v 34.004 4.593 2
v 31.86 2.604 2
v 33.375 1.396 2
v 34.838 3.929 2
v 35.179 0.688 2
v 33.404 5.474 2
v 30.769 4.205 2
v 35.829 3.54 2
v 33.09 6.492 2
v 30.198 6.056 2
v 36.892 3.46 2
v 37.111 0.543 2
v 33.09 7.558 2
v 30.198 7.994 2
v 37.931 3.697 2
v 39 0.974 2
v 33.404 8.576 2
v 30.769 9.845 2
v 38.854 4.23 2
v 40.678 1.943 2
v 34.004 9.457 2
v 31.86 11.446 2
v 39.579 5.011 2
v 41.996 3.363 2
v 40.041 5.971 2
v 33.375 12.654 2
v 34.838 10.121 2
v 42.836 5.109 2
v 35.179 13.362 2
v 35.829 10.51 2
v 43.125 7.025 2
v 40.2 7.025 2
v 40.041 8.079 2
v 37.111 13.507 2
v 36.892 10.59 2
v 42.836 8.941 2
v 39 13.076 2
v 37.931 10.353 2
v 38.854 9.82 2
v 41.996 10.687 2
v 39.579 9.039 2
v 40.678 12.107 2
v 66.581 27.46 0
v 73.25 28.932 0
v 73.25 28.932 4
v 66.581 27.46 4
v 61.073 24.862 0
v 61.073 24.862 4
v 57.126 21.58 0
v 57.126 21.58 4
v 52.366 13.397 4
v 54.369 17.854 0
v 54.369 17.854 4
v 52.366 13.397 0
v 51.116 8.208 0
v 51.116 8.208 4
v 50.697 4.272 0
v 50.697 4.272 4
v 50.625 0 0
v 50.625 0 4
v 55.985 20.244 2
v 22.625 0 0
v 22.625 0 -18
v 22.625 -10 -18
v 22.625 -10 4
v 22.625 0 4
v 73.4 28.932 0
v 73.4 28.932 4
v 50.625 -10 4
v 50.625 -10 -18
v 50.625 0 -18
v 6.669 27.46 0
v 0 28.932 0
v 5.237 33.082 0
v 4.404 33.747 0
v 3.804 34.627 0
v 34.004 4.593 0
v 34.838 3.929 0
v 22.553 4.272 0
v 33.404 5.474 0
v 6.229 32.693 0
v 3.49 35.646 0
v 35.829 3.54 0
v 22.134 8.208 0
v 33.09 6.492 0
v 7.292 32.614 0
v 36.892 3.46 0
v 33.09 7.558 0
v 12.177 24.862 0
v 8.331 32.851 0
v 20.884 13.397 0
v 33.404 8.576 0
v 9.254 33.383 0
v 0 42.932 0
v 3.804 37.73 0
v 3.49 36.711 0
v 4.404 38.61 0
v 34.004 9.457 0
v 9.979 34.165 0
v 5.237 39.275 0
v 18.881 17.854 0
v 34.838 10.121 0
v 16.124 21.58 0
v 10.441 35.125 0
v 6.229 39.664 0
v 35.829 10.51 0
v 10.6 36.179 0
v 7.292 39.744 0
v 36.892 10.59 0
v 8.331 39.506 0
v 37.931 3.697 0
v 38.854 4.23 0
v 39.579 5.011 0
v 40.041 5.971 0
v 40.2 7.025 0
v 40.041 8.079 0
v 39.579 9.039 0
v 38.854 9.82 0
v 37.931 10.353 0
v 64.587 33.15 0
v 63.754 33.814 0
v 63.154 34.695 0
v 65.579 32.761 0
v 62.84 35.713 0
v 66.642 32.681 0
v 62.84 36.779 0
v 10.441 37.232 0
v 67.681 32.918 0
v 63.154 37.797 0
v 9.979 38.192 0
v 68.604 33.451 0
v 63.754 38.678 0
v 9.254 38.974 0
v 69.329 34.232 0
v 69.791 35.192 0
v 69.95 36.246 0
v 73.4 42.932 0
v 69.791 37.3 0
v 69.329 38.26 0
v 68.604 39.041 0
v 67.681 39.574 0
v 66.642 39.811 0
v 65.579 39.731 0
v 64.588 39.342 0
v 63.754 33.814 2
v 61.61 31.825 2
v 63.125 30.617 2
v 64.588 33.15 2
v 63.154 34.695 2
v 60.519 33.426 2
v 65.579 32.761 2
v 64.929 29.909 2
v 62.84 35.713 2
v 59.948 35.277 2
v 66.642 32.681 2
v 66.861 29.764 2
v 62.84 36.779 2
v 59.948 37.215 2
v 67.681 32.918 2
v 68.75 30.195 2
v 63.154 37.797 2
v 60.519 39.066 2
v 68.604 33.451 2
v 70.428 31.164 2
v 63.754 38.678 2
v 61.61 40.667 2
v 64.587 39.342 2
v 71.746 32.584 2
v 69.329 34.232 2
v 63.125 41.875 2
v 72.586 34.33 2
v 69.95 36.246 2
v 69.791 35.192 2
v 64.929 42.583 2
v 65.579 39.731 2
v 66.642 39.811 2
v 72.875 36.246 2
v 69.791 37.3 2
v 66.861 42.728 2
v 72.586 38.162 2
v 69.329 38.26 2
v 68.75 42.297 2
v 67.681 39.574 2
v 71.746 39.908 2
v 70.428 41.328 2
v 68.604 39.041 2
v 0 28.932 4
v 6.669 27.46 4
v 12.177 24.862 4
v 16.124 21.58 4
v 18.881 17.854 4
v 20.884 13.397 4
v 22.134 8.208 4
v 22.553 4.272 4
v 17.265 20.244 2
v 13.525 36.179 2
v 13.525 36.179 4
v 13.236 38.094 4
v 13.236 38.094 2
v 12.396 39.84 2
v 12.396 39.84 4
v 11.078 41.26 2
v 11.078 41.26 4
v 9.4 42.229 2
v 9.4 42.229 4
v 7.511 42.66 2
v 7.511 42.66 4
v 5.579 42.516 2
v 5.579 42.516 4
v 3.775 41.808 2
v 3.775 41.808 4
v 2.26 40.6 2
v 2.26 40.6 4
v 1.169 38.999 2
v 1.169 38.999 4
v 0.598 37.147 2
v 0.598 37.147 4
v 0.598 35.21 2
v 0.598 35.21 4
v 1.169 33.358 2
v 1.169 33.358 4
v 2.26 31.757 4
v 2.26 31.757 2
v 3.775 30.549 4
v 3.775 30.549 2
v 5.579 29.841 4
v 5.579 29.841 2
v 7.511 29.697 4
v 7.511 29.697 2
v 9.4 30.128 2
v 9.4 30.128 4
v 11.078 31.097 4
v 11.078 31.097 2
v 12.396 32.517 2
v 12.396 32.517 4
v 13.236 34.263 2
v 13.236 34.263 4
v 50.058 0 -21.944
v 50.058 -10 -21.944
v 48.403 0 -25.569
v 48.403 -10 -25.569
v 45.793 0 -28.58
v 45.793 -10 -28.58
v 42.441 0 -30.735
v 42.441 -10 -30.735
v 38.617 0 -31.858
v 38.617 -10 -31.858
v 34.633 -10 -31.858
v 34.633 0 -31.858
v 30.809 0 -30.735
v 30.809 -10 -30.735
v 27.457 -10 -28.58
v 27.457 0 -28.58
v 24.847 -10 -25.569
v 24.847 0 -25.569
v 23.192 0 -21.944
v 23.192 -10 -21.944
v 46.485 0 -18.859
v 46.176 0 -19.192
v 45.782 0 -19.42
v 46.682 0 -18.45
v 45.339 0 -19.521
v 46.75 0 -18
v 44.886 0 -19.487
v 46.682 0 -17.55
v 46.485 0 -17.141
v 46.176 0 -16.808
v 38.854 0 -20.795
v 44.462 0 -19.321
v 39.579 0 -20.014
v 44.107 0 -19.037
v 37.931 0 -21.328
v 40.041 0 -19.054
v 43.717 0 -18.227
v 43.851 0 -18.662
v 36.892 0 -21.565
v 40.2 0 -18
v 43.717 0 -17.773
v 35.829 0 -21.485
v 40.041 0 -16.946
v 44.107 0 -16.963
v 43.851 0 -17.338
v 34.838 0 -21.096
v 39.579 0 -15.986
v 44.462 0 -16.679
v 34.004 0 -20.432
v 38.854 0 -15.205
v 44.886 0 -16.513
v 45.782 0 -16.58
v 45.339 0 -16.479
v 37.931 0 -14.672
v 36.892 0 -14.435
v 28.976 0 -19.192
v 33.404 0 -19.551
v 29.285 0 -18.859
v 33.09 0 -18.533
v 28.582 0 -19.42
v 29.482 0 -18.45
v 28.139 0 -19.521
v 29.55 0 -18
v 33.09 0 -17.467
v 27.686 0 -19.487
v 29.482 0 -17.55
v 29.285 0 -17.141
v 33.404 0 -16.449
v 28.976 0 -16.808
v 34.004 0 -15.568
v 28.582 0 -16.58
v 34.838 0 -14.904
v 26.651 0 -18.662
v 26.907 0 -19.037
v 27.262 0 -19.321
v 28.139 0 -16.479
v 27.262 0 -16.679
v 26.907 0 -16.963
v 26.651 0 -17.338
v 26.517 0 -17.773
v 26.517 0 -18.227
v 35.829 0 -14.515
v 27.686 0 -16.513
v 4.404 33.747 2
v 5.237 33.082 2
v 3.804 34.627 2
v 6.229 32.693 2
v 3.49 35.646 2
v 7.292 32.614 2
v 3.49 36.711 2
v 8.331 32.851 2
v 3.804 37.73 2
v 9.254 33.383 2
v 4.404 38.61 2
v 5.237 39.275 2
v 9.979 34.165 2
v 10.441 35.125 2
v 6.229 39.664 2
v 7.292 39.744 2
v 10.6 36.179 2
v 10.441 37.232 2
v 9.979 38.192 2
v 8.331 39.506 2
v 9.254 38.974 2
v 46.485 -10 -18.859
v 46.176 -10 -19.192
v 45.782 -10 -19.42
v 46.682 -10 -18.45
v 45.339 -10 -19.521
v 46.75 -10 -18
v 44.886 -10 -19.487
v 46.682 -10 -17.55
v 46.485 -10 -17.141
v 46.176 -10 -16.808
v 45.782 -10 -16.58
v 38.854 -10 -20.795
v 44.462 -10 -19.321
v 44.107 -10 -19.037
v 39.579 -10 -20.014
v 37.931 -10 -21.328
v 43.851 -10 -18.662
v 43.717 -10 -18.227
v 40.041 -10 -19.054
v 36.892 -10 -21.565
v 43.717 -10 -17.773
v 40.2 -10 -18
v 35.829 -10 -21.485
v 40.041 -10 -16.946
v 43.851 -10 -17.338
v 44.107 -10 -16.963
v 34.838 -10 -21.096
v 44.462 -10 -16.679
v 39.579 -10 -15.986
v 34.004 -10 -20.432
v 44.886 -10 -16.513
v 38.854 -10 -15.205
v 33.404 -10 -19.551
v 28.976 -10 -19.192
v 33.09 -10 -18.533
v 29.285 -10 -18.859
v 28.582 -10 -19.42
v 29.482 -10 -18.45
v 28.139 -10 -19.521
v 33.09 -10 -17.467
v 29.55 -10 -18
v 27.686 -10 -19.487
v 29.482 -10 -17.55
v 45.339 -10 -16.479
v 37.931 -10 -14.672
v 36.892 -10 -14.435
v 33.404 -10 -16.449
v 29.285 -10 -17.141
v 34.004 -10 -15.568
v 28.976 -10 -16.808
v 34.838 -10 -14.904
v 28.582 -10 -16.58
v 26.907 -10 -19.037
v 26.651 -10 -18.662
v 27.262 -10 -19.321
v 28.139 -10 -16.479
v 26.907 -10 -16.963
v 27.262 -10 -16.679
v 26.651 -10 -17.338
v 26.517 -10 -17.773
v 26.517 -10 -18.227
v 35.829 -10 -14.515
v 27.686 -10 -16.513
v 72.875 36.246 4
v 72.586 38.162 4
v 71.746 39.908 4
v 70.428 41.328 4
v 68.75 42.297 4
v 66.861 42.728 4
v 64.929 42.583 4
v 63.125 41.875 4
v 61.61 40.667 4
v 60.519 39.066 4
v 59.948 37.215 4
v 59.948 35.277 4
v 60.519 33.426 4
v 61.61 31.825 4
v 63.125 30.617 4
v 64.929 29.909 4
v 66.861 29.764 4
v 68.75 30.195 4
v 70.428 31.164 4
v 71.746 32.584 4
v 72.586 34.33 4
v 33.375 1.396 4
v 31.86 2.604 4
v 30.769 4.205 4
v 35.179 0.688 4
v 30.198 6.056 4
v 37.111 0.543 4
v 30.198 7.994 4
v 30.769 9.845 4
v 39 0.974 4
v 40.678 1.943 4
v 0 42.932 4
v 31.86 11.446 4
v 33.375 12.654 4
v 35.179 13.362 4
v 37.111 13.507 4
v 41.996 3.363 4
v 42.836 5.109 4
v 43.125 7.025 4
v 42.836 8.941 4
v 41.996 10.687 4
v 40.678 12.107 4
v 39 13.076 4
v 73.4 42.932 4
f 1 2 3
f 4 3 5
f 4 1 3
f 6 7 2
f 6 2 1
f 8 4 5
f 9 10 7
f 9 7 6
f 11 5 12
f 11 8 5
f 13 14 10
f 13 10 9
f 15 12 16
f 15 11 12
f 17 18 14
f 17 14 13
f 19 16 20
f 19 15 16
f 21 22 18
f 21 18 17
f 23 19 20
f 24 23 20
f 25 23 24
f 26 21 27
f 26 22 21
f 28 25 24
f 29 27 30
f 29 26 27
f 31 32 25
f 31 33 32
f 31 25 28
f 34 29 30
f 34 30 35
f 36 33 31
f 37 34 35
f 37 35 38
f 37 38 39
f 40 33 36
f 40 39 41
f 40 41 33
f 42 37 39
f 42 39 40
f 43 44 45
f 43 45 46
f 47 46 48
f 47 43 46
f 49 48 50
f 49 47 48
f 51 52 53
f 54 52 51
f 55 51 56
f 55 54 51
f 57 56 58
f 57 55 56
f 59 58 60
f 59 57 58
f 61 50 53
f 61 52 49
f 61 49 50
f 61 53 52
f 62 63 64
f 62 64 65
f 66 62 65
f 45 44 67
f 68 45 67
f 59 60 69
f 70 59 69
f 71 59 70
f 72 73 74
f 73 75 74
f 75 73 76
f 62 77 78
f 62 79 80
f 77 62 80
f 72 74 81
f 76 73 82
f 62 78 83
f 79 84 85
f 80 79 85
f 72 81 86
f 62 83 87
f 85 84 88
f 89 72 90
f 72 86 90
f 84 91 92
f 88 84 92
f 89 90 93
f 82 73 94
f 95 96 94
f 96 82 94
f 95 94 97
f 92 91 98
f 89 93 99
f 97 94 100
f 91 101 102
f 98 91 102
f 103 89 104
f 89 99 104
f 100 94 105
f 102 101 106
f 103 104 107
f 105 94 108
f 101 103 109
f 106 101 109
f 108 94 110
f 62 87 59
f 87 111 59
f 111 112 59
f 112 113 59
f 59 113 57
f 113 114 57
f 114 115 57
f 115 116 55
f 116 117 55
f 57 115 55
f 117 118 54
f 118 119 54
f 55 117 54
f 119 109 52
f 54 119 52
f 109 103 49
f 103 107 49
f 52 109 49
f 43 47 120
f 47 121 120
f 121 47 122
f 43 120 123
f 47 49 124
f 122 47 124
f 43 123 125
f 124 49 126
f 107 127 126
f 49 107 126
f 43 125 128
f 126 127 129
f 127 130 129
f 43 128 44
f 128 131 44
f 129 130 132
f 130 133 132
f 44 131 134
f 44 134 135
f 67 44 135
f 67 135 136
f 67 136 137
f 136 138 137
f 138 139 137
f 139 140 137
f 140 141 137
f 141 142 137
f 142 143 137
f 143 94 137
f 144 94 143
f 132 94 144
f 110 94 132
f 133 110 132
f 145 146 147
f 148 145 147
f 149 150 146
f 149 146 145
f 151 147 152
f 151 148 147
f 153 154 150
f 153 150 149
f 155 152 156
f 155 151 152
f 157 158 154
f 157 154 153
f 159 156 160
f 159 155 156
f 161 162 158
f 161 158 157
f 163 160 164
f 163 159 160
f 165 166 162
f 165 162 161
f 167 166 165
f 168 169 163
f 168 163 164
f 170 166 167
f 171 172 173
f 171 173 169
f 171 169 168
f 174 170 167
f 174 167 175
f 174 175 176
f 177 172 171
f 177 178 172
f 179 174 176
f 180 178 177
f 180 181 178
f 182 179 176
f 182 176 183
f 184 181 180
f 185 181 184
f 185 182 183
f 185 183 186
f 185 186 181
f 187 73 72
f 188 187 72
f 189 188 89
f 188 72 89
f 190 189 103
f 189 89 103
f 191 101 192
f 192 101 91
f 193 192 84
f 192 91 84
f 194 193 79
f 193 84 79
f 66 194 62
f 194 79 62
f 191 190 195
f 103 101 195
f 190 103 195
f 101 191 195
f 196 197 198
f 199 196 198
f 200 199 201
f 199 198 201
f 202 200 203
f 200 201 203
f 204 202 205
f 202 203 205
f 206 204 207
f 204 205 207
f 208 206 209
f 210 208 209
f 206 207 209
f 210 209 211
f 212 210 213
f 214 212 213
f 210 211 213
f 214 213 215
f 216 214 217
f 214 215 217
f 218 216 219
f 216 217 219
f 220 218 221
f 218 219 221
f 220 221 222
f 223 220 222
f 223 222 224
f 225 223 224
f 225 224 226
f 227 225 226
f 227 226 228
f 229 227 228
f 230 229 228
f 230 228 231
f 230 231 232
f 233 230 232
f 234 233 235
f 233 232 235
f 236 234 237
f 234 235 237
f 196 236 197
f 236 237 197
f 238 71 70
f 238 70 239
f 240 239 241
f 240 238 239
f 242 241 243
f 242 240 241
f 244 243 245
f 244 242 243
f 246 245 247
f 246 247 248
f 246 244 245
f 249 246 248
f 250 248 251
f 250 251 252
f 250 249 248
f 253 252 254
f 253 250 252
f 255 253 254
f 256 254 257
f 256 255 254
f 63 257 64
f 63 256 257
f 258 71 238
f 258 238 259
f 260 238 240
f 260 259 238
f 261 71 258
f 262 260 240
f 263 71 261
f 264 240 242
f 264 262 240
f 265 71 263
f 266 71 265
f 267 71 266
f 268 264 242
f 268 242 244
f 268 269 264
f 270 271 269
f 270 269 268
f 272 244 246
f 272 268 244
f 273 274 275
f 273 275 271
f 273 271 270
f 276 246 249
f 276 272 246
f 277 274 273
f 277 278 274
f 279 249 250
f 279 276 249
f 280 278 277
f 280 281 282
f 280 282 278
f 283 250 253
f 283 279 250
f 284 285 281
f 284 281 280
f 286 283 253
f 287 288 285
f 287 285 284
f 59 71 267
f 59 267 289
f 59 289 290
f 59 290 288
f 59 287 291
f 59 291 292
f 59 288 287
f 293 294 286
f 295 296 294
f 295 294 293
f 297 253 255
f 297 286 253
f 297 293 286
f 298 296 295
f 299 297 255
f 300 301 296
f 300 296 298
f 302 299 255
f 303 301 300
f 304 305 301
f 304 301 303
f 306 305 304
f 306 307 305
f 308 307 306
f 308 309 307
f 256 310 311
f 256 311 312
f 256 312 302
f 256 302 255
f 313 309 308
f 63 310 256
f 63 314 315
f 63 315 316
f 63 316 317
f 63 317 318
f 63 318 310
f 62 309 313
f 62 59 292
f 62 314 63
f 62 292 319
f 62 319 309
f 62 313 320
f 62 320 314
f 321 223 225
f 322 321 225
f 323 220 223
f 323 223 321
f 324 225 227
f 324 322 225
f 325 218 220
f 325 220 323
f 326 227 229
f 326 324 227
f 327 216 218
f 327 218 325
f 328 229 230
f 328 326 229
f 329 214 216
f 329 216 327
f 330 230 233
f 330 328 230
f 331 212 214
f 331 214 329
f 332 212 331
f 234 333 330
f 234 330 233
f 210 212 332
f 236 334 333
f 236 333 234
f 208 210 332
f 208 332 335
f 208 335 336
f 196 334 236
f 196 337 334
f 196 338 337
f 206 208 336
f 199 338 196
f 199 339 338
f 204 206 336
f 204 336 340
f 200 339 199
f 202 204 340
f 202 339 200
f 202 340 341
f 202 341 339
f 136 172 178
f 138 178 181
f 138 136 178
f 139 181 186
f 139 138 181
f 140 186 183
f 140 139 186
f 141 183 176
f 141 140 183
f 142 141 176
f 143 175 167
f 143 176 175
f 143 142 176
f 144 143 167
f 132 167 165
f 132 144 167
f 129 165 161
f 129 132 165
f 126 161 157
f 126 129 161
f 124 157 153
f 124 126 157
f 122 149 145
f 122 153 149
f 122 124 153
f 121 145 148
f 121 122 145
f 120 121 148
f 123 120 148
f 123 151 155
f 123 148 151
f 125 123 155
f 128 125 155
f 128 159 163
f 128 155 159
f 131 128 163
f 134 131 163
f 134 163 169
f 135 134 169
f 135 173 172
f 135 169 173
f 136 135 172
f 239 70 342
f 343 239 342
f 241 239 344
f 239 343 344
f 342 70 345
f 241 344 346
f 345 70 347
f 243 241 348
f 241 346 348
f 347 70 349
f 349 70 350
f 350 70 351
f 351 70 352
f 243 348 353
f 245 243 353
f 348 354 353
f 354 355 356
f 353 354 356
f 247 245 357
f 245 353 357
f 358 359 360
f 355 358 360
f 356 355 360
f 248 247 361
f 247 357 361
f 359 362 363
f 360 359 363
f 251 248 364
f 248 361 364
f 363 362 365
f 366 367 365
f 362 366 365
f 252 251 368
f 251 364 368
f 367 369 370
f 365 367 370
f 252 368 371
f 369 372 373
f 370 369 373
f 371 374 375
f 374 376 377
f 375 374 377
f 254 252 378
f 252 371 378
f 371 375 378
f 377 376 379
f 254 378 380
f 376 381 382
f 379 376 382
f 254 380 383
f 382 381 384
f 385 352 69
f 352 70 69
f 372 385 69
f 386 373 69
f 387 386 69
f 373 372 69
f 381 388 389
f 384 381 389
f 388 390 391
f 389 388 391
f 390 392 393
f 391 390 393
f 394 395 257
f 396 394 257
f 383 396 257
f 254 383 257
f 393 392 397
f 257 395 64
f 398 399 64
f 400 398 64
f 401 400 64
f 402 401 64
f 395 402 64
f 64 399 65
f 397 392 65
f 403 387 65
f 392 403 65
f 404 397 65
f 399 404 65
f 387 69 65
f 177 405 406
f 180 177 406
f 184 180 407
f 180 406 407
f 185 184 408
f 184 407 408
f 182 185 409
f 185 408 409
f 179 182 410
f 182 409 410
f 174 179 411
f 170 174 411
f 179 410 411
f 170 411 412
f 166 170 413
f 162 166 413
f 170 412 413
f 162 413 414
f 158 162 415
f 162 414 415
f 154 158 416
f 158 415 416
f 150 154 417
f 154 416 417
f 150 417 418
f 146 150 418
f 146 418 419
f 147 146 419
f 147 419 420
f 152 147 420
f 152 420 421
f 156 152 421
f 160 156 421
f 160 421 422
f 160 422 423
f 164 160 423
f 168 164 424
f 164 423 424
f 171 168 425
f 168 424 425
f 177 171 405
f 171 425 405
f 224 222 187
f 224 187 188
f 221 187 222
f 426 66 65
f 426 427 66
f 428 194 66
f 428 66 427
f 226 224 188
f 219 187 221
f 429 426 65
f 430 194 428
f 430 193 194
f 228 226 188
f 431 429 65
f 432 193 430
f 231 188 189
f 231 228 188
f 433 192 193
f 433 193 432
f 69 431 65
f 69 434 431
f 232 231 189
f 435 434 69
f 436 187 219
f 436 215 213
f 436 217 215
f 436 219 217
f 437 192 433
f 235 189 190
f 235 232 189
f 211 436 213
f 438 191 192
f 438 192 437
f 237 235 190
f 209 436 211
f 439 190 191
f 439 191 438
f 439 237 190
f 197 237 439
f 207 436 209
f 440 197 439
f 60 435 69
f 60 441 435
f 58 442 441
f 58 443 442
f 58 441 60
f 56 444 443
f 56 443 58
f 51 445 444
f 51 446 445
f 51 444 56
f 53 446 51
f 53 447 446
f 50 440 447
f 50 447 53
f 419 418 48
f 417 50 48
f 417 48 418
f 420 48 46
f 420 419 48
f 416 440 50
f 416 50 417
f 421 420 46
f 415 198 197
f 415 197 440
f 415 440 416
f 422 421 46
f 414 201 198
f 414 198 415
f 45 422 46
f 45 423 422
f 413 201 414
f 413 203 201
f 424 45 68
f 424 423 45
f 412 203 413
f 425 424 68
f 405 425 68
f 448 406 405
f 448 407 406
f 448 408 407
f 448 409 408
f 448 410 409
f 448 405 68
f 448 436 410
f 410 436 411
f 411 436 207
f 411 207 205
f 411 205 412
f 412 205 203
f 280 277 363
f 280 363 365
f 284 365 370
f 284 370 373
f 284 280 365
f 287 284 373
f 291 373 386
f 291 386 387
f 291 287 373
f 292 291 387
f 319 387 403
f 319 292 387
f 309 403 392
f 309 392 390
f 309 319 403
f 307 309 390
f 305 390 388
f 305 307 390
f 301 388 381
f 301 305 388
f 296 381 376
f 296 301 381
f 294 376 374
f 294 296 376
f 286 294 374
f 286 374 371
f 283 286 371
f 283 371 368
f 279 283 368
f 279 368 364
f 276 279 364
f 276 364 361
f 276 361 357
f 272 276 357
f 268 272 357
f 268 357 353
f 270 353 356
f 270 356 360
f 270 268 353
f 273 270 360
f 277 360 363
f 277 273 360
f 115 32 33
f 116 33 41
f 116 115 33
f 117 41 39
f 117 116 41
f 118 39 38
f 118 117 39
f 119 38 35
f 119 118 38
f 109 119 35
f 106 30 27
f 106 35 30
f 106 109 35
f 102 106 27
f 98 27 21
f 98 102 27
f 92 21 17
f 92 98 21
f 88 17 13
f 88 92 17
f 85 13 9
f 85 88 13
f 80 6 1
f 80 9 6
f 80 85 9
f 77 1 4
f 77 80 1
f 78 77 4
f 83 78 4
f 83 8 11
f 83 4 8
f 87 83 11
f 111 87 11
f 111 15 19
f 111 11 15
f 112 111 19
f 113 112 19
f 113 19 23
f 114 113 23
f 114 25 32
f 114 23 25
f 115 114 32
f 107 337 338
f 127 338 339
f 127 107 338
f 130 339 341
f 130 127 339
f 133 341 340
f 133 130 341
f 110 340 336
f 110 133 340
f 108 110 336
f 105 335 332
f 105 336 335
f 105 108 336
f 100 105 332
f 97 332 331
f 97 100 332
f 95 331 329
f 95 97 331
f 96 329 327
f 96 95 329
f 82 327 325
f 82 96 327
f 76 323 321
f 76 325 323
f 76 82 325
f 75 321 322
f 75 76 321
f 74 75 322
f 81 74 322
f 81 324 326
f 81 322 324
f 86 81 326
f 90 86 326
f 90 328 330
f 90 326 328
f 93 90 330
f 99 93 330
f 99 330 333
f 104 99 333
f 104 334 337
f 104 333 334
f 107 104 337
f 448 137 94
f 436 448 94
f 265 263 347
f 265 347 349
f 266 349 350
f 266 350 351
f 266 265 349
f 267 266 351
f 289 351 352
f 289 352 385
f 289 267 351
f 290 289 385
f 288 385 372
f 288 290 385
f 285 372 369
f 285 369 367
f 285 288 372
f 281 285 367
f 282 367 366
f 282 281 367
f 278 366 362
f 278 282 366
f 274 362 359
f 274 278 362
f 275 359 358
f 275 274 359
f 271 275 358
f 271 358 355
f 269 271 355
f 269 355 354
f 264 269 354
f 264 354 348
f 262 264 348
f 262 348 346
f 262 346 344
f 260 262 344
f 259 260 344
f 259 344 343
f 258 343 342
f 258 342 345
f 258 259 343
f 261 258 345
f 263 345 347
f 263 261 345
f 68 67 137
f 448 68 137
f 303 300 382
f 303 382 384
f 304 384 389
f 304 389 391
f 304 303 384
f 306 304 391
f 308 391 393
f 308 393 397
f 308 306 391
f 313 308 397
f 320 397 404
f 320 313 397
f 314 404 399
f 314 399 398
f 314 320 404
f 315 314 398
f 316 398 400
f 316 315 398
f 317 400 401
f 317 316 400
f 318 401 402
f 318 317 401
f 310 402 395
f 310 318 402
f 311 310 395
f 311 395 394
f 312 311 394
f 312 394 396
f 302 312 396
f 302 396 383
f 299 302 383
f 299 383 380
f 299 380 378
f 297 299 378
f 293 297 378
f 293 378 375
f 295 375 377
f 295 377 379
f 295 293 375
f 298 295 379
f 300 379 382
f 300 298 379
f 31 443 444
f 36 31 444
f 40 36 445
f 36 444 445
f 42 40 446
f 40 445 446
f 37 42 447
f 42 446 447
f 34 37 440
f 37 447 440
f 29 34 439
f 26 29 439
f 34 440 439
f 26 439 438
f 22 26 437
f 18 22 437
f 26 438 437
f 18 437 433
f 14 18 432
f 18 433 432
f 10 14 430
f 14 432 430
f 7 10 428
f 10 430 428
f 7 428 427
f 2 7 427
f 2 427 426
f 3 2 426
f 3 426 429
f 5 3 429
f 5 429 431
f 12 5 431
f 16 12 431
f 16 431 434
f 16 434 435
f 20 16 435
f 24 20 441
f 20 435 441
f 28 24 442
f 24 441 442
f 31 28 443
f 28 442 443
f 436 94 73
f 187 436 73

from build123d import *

# Parameters (mm, degrees)
ESQUISSE1_R             = 3.575
BOSS_EXTRU_1_DEPTH      = 4
ESQUISSE17_R            = 6.5
ENL_V_MAT_EXTRU_9_DEPTH = 2
ESQUISSE18_R            = 3.575
ESQUISSE18_R_2          = 1.525
BOSS_EXTRU_6_DEPTH      = 10


with BuildPart() as part:
    # Esquisse1 → Boss.-Extru.1 (new body)
    with BuildSketch(Plane.XY):
        with BuildLine():
            Line((0, 42.932447878), (0, 28.932447878))
            add(Edge.make_bspline(
                [(0, 28.932447878), (23.217449625, 26.022104371), (22.625, 0)],
                knots=[0, 0, 0, 1, 1, 1], degree=2))
            Line((22.625, 0), (36.625, 0))
            Line((36.625, 0), (50.625, 0))
            add(Edge.make_bspline(
                [(73.25, 28.932447878), (50.032550375, 26.022104371), (50.625, 0)],
                knots=[0, 0, 0, 1, 1, 1], degree=2))
            Line((73.25, 28.932447878), (73.4, 28.932447878))
            Line((73.4, 28.932447878), (73.4, 42.932447878))
            Line((73.4, 42.932447878), (0, 42.932447878))
        make_face()
        with Locations((7.025, 36.178525203)):
            Circle(ESQUISSE1_R, mode=Mode.SUBTRACT)
        with Locations((66.375, 36.245920154)):
            Circle(ESQUISSE1_R, mode=Mode.SUBTRACT)
        with Locations((36.625, 7.025)):
            Circle(ESQUISSE1_R, mode=Mode.SUBTRACT)
    extrude(amount=BOSS_EXTRU_1_DEPTH)

    # Esquisse17 → Enlèv. mat.-Extru.9 (cut)
    with BuildSketch(Plane.XY.offset(4)):
        with Locations((7.025, 36.178525203)):
            Circle(ESQUISSE17_R)
        with Locations((66.375, 36.245920154)):
            Circle(ESQUISSE17_R)
        with Locations((36.625, 7.025)):
            Circle(ESQUISSE17_R)
    extrude(amount=-ENL_V_MAT_EXTRU_9_DEPTH, mode=Mode.SUBTRACT)

    # Esquisse18 → Boss.-Extru.6 (add)
    with BuildSketch(Plane.XZ):
        with BuildLine():
            Line((22.625, -18), (22.625, 4))
            Line((22.625, 4), (50.625, 4))
            Line((50.625, 4), (50.625, -18))
            ThreePointArc((50.625, -18), (36.625, -32), (22.625, -18))
        make_face()
        with Locations((36.625, -18)):
            Circle(ESQUISSE18_R, mode=Mode.SUBTRACT)
        with Locations((28.025, -18)):
            Circle(ESQUISSE18_R_2, mode=Mode.SUBTRACT)
        with Locations((45.225, -18)):
            Circle(ESQUISSE18_R_2, mode=Mode.SUBTRACT)
    extrude(amount=BOSS_EXTRU_6_DEPTH)


solid = part.part
